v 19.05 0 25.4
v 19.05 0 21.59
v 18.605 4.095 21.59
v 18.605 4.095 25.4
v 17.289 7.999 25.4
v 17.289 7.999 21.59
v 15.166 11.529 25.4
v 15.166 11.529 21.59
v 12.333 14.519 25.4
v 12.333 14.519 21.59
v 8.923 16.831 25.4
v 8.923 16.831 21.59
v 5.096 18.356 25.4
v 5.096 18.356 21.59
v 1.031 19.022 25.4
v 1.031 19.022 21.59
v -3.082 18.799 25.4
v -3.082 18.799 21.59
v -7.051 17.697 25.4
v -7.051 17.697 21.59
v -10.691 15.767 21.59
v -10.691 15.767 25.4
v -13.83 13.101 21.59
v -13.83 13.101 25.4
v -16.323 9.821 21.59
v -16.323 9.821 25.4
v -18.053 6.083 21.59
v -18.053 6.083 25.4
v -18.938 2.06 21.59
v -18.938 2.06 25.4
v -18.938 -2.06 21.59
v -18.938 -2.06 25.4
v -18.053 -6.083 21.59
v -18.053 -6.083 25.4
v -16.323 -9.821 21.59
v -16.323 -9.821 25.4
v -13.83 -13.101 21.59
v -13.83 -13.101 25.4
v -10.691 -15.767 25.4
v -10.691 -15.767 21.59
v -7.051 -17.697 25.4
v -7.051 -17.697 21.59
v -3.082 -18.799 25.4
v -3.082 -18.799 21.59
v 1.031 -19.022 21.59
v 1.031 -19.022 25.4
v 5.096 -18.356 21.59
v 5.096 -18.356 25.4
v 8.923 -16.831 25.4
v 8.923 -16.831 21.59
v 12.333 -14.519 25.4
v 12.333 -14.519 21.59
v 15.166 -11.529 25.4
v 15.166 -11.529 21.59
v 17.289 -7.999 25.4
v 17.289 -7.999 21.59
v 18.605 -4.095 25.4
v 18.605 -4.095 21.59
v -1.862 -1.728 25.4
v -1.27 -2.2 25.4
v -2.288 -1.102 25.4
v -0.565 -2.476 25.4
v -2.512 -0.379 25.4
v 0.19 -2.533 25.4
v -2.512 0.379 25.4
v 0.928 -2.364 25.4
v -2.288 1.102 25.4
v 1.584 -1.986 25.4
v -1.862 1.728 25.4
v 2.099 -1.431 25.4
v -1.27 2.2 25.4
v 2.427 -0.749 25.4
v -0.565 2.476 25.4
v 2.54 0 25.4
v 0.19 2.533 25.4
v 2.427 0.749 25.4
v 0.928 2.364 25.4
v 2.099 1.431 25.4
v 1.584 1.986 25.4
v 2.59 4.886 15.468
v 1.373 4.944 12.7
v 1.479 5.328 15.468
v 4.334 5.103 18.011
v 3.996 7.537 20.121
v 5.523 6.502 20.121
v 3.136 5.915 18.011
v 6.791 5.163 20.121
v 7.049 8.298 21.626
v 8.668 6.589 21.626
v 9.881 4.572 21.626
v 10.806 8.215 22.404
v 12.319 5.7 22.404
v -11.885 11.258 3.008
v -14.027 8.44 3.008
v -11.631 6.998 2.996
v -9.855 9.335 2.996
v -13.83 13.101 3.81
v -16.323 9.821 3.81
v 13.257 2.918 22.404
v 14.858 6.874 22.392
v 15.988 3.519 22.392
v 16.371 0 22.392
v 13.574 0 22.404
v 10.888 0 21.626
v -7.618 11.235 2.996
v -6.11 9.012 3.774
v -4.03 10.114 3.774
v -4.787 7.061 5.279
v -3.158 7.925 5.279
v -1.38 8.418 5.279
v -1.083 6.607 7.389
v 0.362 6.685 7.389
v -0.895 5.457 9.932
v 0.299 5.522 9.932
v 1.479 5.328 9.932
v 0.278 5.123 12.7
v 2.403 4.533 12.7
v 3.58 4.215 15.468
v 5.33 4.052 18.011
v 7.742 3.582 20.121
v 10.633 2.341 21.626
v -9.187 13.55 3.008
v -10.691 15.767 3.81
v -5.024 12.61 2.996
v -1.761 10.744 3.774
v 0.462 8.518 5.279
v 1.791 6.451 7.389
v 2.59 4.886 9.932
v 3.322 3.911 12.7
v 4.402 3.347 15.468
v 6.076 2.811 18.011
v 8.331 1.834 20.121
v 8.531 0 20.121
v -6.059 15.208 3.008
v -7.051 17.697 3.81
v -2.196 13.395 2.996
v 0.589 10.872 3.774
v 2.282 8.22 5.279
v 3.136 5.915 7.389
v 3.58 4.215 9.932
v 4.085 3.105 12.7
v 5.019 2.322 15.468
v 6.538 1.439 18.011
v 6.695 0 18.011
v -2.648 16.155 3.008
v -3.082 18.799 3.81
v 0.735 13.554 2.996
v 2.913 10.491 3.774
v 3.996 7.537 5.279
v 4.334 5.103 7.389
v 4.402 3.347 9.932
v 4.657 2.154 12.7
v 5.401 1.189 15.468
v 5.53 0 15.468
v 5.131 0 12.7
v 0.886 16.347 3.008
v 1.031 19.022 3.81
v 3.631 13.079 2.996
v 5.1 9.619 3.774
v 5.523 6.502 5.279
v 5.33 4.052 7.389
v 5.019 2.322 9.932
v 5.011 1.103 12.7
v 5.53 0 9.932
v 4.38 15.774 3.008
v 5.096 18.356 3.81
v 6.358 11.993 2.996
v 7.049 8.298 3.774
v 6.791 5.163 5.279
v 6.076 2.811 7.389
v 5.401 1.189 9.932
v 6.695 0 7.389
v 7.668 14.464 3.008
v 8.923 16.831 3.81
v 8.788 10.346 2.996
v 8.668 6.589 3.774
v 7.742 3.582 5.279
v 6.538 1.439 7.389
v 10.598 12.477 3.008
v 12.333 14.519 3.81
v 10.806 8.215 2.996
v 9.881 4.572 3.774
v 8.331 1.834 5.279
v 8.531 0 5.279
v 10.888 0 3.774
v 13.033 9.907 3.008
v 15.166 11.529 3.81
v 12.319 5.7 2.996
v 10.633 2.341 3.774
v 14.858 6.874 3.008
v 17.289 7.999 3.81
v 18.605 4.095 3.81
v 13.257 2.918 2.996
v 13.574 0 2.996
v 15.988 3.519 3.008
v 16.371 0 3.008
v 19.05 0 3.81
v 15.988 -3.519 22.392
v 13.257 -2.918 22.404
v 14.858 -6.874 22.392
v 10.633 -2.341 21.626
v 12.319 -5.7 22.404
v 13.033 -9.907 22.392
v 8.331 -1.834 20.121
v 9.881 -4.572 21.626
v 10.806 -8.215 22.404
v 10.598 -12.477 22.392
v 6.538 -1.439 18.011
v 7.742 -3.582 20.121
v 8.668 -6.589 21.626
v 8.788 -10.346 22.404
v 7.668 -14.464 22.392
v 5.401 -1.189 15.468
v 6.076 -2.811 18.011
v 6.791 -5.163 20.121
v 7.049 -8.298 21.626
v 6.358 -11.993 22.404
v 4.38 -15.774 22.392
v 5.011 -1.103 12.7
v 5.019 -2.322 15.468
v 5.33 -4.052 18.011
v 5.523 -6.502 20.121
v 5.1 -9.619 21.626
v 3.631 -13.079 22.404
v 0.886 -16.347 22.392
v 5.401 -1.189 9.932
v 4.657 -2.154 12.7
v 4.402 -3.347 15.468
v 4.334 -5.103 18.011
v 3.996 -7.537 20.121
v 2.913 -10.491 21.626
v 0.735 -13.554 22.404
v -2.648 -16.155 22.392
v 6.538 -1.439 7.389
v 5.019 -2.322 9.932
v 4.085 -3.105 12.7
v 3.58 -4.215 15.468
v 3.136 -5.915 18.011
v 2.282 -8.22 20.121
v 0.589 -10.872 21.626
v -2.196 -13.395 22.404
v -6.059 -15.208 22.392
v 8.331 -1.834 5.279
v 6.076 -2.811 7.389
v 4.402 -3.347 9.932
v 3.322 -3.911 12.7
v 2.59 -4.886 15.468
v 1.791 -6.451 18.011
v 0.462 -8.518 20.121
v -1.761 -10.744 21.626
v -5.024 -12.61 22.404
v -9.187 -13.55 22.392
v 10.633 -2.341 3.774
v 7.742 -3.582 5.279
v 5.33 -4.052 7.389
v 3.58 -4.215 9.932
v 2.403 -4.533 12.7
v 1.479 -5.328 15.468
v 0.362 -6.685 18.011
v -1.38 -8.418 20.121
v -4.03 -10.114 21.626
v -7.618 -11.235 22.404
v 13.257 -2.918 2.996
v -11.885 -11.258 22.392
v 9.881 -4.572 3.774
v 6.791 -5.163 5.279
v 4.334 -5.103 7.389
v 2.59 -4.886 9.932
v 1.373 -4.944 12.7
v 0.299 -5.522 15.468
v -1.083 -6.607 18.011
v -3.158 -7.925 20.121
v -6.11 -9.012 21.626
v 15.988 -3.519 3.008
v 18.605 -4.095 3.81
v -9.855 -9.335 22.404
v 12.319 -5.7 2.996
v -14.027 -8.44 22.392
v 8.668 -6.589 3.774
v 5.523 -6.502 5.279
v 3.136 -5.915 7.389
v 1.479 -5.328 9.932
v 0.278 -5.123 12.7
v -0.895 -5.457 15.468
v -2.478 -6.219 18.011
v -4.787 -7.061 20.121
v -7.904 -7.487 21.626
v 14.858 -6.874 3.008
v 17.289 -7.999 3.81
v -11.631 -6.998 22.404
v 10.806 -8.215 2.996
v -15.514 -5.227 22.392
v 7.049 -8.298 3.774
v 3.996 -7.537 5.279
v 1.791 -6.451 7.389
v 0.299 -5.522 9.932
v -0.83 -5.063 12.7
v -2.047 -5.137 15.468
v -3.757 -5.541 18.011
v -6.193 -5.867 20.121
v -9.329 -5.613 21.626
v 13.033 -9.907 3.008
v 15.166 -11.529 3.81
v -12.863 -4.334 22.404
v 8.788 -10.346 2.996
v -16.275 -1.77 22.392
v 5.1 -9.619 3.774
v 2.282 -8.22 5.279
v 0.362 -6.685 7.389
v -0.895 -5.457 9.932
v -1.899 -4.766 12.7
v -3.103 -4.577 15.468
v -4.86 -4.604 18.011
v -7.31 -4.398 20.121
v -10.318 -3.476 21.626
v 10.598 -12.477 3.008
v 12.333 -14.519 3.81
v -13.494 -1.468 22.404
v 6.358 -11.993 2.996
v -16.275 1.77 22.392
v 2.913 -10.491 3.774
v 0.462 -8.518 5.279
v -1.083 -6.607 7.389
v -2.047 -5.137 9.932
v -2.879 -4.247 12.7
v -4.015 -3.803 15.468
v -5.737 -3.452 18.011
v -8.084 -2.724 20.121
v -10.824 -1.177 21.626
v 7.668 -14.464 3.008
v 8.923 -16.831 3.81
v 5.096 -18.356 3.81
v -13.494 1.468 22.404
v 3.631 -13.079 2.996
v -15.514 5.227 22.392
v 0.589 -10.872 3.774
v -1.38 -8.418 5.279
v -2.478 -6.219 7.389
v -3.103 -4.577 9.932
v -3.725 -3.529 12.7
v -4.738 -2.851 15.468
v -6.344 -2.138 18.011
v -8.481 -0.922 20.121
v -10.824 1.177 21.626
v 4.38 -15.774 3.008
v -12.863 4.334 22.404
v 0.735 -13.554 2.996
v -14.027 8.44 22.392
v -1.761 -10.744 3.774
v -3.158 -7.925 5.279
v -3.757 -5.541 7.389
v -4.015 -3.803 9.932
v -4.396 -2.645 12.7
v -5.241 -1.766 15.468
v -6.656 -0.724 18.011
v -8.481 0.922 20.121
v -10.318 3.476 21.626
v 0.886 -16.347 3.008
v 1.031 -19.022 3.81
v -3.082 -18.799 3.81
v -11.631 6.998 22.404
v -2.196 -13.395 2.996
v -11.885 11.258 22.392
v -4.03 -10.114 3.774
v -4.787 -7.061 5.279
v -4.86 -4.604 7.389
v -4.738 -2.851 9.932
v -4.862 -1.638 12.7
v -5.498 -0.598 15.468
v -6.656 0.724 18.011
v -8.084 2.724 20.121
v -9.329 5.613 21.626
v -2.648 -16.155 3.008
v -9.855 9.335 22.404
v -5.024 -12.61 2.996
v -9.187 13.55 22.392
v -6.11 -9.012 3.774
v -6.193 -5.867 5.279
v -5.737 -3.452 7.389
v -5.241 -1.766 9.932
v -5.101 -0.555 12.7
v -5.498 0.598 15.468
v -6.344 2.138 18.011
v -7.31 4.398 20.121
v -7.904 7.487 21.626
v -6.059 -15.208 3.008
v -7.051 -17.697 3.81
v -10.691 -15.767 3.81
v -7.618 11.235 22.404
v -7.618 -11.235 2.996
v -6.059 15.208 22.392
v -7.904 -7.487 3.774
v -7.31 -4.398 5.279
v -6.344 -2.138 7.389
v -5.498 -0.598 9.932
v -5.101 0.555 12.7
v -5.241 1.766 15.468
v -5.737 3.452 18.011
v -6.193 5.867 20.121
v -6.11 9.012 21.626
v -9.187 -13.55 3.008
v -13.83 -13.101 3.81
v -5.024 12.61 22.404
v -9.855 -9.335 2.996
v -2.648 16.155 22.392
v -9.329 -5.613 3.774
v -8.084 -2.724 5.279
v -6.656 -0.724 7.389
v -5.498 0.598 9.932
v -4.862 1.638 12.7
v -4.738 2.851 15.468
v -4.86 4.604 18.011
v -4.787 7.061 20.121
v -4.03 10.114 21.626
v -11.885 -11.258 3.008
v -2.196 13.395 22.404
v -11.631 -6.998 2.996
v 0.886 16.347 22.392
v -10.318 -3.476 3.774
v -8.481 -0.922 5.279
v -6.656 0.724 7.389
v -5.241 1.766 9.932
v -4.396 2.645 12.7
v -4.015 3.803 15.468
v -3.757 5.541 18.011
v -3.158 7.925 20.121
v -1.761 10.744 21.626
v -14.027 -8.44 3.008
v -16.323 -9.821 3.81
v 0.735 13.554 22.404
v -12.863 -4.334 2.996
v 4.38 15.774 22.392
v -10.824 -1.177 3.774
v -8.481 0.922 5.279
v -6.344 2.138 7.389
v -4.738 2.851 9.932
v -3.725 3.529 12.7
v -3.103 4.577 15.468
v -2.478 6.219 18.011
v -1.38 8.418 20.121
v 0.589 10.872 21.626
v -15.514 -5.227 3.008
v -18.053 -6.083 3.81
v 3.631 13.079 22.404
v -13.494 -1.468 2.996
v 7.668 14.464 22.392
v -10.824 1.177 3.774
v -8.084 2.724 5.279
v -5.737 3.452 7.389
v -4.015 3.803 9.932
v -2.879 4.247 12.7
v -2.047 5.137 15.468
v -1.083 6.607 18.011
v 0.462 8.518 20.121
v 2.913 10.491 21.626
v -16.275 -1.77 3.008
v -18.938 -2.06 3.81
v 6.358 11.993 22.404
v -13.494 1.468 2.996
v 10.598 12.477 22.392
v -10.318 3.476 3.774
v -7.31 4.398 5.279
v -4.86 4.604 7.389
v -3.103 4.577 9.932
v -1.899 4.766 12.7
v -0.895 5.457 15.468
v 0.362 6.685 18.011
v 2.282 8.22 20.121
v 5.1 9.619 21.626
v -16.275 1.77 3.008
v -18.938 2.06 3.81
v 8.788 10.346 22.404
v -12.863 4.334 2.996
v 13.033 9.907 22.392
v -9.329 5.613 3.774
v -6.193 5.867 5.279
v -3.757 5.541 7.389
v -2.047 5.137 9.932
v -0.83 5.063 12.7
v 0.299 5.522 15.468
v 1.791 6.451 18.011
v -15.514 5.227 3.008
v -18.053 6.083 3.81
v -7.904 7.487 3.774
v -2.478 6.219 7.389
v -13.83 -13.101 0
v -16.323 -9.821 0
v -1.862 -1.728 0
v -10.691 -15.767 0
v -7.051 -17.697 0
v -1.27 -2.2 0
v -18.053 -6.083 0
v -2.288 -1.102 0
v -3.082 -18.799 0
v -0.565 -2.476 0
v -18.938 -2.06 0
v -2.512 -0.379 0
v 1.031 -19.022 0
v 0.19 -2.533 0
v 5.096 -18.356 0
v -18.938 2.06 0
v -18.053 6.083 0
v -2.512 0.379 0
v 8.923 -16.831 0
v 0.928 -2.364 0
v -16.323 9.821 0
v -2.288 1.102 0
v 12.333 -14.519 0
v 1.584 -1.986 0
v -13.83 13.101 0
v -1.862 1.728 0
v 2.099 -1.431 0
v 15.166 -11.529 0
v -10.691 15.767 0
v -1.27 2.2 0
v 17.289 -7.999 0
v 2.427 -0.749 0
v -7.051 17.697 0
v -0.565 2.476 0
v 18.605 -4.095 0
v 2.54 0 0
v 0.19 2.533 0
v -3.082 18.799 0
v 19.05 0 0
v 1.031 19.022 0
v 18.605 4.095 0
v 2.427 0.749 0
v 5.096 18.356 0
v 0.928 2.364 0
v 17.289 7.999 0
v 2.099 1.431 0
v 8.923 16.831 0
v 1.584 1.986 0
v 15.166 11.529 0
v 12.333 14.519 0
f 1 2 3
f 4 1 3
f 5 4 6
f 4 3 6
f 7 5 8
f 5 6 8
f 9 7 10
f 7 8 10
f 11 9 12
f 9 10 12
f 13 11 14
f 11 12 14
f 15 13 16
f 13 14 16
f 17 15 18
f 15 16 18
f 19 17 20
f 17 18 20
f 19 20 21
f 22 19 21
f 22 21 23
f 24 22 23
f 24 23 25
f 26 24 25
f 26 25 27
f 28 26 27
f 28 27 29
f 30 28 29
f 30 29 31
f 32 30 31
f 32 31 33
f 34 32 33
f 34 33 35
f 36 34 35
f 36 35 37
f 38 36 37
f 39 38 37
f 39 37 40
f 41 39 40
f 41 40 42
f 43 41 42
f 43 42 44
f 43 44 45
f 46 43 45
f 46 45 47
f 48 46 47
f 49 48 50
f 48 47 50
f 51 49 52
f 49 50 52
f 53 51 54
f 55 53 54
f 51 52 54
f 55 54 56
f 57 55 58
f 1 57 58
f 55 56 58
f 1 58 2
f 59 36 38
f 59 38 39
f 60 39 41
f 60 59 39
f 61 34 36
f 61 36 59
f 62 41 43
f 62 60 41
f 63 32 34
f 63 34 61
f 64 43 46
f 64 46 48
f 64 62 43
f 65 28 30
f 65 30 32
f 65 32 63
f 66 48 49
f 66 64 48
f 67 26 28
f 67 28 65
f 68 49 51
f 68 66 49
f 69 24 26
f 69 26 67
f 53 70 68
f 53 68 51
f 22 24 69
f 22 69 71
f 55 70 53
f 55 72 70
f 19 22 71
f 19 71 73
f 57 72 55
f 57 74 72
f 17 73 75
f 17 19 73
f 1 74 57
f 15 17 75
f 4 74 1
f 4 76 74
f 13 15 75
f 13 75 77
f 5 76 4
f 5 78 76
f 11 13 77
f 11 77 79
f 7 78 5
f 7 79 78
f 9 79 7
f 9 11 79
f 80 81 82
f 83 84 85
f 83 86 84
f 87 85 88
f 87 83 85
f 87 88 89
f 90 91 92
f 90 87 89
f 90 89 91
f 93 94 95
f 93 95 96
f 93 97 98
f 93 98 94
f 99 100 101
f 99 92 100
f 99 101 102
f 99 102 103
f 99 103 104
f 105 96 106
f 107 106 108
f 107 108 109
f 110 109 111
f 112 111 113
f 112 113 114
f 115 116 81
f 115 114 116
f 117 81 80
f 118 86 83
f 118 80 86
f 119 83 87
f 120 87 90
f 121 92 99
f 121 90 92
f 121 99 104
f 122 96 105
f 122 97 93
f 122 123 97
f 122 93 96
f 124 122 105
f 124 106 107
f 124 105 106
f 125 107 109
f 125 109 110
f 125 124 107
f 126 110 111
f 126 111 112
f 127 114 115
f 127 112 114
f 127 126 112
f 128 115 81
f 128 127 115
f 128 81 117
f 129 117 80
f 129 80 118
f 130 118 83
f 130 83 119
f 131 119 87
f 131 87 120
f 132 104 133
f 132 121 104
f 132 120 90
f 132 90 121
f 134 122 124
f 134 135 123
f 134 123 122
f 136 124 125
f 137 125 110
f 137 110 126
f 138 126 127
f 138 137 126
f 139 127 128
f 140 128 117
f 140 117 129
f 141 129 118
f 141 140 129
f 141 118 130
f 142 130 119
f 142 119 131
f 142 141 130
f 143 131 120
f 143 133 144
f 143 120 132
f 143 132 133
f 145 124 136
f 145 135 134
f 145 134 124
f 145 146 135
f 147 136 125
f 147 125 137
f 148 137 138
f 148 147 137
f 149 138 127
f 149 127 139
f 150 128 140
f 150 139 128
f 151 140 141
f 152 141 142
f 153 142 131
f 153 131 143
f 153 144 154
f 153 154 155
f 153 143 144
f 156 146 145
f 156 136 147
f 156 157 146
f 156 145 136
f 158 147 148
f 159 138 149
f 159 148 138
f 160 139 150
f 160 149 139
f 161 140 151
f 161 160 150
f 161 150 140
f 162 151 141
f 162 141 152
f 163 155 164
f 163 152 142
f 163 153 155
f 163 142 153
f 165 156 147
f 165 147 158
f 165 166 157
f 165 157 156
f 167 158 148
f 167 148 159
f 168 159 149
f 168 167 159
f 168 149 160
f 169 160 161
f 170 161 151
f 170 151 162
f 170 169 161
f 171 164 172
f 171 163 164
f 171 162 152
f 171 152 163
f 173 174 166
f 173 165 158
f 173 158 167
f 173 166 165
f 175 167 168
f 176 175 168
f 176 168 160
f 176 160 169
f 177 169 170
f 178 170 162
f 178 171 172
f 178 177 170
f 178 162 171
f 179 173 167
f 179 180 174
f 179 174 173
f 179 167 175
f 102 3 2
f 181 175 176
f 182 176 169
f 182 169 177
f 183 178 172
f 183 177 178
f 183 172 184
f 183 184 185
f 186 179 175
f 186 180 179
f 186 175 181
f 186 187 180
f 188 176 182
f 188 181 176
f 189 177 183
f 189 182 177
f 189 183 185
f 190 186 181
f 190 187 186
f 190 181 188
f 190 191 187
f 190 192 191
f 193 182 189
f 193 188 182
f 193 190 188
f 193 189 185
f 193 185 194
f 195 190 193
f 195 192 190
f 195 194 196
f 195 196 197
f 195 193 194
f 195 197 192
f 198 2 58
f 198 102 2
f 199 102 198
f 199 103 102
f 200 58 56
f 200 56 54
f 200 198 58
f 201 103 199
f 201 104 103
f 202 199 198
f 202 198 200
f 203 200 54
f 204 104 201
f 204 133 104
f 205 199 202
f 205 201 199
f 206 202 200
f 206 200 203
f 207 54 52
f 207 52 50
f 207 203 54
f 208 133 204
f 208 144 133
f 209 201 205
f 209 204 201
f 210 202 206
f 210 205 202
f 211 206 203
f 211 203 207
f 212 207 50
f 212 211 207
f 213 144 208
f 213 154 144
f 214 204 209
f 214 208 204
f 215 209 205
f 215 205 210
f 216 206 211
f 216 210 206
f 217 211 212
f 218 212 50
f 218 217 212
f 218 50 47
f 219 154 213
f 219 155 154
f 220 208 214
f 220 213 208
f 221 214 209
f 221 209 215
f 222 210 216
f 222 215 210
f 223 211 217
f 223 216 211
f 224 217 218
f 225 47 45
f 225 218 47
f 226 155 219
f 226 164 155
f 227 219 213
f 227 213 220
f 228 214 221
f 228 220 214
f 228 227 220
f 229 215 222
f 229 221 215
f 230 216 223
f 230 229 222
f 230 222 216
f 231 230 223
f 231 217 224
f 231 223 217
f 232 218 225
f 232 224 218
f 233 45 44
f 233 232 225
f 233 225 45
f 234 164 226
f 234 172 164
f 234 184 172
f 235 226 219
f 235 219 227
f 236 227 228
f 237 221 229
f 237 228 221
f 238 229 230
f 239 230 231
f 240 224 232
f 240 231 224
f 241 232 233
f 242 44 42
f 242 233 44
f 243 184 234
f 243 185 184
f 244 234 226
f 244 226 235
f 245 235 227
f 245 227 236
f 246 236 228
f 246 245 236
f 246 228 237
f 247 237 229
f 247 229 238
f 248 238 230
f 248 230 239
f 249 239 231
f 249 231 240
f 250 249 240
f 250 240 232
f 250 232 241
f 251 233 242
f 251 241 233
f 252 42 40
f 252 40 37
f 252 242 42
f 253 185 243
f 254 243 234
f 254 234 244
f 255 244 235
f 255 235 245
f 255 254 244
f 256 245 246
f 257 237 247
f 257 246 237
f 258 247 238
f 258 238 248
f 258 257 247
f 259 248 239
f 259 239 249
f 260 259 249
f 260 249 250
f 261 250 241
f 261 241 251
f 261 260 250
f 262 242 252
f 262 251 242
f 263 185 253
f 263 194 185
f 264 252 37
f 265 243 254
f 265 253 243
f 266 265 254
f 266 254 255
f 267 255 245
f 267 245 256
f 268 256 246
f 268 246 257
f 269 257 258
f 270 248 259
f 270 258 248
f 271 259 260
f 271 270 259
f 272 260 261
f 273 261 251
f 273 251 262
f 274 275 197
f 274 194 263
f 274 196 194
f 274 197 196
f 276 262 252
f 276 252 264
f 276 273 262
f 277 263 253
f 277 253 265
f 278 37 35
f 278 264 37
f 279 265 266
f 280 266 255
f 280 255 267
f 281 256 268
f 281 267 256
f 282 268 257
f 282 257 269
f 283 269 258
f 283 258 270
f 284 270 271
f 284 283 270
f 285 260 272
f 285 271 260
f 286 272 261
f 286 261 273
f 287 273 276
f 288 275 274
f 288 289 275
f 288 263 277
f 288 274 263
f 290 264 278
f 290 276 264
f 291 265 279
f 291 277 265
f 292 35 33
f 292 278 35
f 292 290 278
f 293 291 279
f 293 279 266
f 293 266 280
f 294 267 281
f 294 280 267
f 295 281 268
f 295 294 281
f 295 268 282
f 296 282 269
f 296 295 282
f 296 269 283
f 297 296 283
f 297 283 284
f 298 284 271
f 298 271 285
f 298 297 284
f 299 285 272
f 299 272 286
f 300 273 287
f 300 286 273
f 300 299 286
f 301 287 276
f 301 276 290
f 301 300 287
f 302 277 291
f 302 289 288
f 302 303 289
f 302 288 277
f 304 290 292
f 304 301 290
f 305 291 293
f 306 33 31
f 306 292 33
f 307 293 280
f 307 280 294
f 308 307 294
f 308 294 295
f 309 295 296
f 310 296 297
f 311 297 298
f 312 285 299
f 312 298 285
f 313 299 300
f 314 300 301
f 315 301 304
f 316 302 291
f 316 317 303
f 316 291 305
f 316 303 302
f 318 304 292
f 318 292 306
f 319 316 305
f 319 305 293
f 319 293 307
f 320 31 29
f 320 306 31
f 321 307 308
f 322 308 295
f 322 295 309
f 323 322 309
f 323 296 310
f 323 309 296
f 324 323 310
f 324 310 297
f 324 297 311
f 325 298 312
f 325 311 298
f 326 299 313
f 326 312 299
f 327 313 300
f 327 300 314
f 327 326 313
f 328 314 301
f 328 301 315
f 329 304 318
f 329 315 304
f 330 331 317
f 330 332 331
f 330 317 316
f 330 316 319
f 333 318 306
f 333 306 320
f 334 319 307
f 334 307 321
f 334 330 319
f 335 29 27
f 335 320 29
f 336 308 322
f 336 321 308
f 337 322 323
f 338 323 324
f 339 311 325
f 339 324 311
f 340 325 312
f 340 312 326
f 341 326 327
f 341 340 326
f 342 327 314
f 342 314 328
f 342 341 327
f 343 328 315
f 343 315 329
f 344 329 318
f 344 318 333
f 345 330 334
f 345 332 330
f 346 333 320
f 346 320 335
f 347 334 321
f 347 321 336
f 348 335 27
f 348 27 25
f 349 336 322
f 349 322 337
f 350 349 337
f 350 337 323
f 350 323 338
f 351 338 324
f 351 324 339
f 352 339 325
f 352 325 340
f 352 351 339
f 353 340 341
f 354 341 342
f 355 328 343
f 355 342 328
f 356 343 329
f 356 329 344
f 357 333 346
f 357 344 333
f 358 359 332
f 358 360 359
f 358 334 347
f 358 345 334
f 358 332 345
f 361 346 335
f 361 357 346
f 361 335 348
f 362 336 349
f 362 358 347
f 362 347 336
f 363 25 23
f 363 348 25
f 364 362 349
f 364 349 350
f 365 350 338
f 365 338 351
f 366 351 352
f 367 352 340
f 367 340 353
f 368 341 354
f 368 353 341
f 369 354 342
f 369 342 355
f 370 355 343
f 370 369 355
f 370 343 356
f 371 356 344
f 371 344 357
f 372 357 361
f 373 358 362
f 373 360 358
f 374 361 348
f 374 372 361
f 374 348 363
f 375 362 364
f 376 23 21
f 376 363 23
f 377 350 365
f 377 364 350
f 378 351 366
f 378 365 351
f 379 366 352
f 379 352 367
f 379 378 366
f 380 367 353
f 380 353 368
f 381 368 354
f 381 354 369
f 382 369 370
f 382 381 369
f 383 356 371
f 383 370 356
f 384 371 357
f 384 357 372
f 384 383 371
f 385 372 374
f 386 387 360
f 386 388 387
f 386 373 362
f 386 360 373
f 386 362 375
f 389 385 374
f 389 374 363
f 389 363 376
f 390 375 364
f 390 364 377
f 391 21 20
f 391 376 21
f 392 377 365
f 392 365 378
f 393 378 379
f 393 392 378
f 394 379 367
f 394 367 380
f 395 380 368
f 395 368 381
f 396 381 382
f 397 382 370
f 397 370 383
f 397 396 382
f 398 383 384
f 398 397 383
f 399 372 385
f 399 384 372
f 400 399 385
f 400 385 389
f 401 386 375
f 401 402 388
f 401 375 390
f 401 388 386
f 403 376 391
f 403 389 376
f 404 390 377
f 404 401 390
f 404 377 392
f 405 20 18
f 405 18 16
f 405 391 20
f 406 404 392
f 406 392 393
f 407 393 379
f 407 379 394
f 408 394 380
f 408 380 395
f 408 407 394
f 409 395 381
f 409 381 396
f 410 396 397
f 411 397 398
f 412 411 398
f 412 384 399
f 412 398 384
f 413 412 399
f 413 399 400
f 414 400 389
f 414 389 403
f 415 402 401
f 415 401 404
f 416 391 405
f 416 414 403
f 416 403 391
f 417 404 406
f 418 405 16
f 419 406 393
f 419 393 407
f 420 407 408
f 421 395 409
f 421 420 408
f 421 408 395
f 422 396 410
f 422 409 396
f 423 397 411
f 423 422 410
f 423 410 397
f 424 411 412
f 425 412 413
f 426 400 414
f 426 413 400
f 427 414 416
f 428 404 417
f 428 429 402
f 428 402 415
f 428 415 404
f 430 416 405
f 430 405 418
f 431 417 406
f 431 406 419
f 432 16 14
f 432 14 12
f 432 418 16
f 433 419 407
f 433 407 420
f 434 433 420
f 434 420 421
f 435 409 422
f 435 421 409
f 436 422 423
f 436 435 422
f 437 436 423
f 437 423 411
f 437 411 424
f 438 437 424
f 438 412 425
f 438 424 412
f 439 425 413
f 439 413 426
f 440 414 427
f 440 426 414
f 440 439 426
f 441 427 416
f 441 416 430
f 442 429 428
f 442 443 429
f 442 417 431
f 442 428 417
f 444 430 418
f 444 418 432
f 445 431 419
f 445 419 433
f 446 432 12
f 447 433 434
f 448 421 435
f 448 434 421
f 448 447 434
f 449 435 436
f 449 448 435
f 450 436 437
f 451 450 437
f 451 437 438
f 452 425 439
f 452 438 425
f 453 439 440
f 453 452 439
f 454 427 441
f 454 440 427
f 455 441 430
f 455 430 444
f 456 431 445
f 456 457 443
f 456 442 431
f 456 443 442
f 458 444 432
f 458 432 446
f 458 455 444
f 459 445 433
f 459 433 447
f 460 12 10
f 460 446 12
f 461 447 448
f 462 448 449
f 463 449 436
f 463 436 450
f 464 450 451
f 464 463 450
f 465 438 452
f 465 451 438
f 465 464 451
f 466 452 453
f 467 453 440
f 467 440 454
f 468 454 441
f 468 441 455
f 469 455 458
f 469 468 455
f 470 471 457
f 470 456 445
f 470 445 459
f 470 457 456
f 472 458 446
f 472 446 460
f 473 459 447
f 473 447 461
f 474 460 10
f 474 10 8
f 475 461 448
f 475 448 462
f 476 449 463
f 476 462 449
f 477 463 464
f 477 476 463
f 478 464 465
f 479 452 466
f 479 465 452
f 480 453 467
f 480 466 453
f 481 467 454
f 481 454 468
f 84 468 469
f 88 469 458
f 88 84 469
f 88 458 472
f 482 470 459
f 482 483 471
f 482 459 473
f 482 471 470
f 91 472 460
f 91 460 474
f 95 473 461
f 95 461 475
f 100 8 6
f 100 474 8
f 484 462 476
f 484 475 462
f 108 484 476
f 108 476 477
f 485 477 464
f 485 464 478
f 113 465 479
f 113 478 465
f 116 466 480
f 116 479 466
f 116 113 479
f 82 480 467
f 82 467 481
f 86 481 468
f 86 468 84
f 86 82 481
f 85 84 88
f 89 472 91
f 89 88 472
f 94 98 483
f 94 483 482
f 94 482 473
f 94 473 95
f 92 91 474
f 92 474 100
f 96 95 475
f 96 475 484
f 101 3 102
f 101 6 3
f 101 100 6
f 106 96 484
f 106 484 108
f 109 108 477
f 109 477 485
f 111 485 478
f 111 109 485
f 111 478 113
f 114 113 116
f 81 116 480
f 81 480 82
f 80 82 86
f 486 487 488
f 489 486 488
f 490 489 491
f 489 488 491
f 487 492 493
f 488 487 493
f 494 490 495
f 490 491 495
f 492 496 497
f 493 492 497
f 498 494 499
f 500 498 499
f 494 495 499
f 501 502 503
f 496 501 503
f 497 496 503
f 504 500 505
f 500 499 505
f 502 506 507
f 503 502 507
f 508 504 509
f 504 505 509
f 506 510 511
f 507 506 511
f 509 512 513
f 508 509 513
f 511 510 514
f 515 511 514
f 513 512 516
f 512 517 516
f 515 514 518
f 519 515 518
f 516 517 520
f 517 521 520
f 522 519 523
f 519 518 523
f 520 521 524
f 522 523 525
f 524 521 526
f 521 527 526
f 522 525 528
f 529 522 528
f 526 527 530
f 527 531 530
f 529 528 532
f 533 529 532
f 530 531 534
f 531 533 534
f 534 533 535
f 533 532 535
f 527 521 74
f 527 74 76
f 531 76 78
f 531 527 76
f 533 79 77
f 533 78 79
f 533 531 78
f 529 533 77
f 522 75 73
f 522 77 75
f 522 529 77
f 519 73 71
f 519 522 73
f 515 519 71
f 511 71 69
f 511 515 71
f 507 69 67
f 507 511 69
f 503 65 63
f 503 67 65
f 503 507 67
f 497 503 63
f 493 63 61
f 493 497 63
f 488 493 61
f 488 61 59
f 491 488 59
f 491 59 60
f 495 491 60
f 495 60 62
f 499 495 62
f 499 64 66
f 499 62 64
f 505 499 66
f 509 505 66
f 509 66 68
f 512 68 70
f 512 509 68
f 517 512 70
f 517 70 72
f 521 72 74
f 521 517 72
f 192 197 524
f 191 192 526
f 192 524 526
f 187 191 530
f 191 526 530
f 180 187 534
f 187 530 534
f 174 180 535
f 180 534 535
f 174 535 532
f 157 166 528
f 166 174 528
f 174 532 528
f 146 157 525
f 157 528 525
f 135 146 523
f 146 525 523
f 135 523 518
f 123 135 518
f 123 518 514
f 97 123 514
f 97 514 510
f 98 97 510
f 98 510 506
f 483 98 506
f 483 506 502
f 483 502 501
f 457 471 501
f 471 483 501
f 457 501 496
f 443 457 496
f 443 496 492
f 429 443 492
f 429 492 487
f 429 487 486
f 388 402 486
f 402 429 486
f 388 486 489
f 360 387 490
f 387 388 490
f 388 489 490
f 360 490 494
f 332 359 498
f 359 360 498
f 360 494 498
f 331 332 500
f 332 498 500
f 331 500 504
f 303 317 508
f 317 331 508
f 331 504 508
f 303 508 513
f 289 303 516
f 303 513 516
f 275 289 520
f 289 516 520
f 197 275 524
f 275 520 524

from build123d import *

# Parameters (mm, degrees)
SKETCH1_R               = 19.05
BOSS_EXTRUDE1_DEPTH     = 25.4
CUT_EXTRUDE1_DEPTH      = 36.83
CUT_EXTRUDE1_DEPTH_BACK = 7.366
SKETCH3_R               = 2.54


with BuildPart() as part:
    # Sketch1 → Boss-Extrude1 (new body)
    with BuildSketch(Plane.XY):
        Circle(SKETCH1_R)
    extrude(amount=BOSS_EXTRUDE1_DEPTH)

    # Sketch2 → Cut-Revolve1 (revolve, cut)
    with BuildSketch(Plane(origin=(0, 0, 0), x_dir=(0, 0, -1), z_dir=(1, 0, 0)), mode=Mode.PRIVATE) as cut_revolve1_sk:
        with BuildLine():
            Line((-3.81, 19.05), (-21.59, 19.05))
            ThreePointArc((-21.59, 19.05), (-12.7, 5.130913707), (-3.81, 19.05))
        make_face()
    revolve(cut_revolve1_sk.sketch.rotate(Axis((0, 0, 36.401990555), (0, 0, -1)), 90), axis=Axis((0, 0, 36.401990555), (0, 0, -1)), mode=Mode.SUBTRACT)

    # Sketch3 → Cut-Extrude1 (cut, two sides: drawn at the far end of the back side and taken through both)
    with BuildSketch(Plane.XY.offset(-CUT_EXTRUDE1_DEPTH_BACK)):
        Circle(SKETCH3_R)
    extrude(amount=CUT_EXTRUDE1_DEPTH + CUT_EXTRUDE1_DEPTH_BACK, mode=Mode.SUBTRACT)


solid = part.part
